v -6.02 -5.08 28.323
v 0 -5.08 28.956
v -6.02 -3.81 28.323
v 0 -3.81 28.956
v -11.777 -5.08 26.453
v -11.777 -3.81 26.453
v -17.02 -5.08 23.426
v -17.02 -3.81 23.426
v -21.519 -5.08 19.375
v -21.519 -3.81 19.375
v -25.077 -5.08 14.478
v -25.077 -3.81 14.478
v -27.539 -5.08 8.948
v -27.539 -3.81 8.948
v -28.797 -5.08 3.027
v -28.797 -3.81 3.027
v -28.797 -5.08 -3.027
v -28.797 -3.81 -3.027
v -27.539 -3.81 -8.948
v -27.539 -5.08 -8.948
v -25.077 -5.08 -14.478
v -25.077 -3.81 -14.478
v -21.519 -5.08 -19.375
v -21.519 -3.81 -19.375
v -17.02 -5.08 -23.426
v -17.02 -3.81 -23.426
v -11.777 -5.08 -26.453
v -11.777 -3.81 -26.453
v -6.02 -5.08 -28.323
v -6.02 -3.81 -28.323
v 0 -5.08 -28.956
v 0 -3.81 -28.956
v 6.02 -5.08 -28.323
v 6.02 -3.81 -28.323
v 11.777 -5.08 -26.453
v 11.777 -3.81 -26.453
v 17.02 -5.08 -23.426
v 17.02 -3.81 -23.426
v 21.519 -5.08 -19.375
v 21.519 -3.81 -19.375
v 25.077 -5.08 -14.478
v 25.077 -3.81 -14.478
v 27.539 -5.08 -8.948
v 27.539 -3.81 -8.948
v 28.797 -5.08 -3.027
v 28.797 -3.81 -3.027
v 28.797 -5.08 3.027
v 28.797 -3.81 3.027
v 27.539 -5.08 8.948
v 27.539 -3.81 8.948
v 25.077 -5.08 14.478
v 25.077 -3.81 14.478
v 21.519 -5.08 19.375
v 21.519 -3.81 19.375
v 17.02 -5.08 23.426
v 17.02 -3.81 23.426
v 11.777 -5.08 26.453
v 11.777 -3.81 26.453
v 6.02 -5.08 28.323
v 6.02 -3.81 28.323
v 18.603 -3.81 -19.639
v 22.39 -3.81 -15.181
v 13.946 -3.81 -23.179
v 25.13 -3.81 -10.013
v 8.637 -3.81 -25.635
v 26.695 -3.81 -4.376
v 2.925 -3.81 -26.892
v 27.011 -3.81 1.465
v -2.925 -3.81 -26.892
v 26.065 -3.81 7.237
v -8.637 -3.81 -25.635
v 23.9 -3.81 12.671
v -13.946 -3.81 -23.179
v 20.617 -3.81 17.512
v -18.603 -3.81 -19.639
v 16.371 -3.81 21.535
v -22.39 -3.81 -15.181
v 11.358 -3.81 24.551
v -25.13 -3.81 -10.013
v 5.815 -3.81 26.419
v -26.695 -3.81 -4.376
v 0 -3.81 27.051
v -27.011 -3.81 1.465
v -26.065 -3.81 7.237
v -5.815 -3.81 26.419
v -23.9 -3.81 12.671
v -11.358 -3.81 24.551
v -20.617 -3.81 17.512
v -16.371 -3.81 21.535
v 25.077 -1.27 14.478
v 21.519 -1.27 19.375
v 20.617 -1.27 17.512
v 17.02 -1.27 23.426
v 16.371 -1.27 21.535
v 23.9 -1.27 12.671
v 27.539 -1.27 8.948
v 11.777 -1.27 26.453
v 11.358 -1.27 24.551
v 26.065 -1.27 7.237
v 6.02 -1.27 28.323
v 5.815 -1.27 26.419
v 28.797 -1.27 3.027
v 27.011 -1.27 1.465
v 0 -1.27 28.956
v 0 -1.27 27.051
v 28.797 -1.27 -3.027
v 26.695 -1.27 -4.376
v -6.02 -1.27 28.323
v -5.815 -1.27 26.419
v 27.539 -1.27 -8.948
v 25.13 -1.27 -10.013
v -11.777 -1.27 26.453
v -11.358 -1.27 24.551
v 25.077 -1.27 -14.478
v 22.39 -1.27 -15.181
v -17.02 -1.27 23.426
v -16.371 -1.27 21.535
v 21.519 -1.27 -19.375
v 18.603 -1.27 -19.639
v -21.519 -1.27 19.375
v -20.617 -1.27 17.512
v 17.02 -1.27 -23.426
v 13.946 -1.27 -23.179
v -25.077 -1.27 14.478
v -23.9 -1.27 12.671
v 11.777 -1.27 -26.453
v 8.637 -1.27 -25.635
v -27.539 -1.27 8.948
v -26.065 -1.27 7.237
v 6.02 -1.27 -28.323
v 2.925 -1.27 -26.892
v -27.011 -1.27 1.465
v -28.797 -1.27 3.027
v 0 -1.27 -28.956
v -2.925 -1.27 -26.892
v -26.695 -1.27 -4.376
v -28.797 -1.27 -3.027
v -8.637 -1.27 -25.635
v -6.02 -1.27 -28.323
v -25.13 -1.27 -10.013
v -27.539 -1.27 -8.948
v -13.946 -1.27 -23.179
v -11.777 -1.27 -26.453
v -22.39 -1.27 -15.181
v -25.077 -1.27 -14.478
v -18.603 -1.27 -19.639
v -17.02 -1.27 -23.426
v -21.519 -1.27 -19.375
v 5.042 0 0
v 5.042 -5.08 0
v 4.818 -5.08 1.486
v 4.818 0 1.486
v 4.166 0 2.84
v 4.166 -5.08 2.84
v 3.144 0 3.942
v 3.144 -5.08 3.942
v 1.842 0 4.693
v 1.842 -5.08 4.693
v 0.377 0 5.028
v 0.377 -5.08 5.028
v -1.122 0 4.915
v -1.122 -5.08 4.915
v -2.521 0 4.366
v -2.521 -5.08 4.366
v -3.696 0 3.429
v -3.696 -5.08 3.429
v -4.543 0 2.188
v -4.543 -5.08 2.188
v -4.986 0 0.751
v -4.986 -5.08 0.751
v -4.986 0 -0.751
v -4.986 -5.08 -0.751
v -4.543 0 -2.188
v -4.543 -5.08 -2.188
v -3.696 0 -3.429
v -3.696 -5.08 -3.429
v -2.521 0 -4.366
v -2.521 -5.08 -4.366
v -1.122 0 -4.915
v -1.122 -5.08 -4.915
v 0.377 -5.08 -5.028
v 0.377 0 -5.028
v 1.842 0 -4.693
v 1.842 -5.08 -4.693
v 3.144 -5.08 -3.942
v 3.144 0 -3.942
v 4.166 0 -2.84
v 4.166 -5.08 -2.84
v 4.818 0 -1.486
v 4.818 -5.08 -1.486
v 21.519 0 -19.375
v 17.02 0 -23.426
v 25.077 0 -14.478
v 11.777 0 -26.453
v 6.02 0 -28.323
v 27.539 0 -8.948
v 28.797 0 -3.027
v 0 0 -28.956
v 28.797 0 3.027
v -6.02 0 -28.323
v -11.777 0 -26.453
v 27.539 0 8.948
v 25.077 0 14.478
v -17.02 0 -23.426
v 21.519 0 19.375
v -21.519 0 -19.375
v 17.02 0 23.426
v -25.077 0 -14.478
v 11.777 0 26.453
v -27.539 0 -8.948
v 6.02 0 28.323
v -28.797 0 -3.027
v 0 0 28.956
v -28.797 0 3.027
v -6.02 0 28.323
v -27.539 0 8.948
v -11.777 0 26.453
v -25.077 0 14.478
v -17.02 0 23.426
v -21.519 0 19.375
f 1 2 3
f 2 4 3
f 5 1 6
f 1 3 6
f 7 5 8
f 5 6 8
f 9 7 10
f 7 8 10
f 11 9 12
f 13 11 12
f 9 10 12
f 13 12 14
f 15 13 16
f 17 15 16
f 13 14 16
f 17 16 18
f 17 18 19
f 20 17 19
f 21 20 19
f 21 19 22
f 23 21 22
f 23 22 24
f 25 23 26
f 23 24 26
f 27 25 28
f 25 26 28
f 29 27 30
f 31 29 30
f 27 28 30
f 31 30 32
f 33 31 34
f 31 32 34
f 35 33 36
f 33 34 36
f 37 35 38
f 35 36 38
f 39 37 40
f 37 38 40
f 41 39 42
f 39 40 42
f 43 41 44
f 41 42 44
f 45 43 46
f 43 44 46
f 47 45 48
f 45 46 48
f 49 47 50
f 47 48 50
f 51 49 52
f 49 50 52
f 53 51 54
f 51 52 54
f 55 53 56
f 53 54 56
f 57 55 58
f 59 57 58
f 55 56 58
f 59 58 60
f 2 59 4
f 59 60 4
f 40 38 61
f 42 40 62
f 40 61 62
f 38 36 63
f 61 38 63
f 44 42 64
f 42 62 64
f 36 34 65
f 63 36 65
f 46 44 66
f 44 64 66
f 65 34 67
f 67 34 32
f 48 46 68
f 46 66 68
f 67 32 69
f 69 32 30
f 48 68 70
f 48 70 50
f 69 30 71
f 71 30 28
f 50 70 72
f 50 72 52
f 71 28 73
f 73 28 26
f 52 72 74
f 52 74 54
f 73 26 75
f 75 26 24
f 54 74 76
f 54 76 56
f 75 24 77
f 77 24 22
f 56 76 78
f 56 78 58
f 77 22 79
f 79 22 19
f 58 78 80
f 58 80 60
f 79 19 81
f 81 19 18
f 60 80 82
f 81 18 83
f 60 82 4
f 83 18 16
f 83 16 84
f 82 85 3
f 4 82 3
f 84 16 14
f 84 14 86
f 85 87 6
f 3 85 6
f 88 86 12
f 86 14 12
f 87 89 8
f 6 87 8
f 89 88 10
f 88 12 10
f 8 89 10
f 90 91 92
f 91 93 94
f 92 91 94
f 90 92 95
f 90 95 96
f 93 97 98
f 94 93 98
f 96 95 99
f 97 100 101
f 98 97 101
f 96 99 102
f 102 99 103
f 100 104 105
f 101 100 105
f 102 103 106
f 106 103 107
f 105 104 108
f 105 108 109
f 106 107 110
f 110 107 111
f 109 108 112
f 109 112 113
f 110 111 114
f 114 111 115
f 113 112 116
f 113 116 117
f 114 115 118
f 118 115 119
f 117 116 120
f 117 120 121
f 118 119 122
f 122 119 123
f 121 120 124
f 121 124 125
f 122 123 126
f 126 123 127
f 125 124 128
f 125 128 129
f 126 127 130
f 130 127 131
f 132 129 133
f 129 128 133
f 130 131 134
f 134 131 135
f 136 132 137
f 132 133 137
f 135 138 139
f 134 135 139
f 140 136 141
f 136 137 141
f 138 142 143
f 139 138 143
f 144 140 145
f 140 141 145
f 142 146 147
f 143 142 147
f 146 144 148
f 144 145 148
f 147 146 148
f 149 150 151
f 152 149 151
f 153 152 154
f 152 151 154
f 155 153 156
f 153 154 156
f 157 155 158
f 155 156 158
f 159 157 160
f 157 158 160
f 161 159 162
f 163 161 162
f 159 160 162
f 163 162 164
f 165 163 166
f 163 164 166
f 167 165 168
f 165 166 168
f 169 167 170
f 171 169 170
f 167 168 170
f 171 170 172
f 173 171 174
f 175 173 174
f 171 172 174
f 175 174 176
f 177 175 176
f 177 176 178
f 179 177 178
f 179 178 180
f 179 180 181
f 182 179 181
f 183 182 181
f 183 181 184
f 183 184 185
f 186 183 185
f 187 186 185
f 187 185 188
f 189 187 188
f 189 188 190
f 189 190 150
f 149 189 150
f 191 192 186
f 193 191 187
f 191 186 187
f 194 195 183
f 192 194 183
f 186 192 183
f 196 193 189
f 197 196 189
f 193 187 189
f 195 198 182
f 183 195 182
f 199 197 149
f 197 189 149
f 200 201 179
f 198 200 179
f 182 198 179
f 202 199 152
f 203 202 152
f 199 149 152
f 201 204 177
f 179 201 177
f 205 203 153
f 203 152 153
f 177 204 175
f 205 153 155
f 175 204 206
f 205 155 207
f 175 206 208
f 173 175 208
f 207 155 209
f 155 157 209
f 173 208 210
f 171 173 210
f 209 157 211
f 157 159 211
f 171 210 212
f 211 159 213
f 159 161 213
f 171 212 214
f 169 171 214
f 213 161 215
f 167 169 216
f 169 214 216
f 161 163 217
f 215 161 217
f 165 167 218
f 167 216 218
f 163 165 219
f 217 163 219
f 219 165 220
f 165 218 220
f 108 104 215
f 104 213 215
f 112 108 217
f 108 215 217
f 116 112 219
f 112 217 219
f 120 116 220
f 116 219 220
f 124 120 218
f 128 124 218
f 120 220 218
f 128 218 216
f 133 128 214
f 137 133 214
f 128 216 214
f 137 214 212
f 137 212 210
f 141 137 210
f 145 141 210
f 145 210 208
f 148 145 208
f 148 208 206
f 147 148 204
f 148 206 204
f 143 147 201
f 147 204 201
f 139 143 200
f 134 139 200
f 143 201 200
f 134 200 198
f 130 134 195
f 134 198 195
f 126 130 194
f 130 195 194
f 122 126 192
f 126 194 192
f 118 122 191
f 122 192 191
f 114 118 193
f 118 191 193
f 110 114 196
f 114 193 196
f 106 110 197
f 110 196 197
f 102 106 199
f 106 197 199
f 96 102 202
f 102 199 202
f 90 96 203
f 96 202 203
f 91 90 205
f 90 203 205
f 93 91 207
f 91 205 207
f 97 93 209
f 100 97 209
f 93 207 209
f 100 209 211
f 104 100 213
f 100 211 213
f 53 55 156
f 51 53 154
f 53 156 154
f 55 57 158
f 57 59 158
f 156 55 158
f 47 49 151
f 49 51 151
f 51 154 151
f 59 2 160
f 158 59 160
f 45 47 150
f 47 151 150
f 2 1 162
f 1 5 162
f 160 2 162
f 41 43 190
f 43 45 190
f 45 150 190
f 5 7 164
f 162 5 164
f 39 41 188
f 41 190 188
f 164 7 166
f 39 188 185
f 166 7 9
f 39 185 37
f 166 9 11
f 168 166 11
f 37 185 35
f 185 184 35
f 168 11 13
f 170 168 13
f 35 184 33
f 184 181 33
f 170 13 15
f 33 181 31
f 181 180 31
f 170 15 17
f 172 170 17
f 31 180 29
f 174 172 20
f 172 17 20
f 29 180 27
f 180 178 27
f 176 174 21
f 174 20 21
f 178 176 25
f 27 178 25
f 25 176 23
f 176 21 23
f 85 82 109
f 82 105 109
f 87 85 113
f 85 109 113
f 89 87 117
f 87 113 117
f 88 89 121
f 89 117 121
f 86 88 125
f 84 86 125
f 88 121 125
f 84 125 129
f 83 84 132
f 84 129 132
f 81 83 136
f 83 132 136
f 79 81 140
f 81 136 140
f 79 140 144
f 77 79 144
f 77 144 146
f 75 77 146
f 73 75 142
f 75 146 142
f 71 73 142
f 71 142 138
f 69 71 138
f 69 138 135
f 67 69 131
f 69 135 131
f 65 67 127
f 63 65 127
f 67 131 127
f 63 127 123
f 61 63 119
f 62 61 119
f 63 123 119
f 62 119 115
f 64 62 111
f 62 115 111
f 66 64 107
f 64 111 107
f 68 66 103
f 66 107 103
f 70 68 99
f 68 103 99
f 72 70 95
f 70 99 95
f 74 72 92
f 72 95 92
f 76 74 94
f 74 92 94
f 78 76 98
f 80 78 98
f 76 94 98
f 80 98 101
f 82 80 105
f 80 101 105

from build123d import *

# Parameters (mm, degrees)
SKETCH6_R          = 5.0419
CUT_EXTRUDE1_DEPTH = 6.08


with BuildPart() as part:
    # Sketch1 → Revolve1 (revolve)
    with BuildSketch(Plane(origin=(0, 0, 0), x_dir=(0, 0, -1), z_dir=(1, 0, 0))):
        Polygon((0, 0), (0, -5.08), (-28.956, -5.08), (-28.956, -3.81), (-27.051, -3.81), (-27.051, -1.27), (-28.956, -1.27), (-28.956, 0), align=None)
    revolve(axis=Axis((0, 0, 0), (0, -1, 0)))

    # Sketch6 → Cut-Extrude1 (cut, through all)
    with BuildSketch(Plane.XZ.offset(5.08)):
        Circle(SKETCH6_R)
    extrude(amount=-CUT_EXTRUDE1_DEPTH, mode=Mode.SUBTRACT)


solid = part.part
